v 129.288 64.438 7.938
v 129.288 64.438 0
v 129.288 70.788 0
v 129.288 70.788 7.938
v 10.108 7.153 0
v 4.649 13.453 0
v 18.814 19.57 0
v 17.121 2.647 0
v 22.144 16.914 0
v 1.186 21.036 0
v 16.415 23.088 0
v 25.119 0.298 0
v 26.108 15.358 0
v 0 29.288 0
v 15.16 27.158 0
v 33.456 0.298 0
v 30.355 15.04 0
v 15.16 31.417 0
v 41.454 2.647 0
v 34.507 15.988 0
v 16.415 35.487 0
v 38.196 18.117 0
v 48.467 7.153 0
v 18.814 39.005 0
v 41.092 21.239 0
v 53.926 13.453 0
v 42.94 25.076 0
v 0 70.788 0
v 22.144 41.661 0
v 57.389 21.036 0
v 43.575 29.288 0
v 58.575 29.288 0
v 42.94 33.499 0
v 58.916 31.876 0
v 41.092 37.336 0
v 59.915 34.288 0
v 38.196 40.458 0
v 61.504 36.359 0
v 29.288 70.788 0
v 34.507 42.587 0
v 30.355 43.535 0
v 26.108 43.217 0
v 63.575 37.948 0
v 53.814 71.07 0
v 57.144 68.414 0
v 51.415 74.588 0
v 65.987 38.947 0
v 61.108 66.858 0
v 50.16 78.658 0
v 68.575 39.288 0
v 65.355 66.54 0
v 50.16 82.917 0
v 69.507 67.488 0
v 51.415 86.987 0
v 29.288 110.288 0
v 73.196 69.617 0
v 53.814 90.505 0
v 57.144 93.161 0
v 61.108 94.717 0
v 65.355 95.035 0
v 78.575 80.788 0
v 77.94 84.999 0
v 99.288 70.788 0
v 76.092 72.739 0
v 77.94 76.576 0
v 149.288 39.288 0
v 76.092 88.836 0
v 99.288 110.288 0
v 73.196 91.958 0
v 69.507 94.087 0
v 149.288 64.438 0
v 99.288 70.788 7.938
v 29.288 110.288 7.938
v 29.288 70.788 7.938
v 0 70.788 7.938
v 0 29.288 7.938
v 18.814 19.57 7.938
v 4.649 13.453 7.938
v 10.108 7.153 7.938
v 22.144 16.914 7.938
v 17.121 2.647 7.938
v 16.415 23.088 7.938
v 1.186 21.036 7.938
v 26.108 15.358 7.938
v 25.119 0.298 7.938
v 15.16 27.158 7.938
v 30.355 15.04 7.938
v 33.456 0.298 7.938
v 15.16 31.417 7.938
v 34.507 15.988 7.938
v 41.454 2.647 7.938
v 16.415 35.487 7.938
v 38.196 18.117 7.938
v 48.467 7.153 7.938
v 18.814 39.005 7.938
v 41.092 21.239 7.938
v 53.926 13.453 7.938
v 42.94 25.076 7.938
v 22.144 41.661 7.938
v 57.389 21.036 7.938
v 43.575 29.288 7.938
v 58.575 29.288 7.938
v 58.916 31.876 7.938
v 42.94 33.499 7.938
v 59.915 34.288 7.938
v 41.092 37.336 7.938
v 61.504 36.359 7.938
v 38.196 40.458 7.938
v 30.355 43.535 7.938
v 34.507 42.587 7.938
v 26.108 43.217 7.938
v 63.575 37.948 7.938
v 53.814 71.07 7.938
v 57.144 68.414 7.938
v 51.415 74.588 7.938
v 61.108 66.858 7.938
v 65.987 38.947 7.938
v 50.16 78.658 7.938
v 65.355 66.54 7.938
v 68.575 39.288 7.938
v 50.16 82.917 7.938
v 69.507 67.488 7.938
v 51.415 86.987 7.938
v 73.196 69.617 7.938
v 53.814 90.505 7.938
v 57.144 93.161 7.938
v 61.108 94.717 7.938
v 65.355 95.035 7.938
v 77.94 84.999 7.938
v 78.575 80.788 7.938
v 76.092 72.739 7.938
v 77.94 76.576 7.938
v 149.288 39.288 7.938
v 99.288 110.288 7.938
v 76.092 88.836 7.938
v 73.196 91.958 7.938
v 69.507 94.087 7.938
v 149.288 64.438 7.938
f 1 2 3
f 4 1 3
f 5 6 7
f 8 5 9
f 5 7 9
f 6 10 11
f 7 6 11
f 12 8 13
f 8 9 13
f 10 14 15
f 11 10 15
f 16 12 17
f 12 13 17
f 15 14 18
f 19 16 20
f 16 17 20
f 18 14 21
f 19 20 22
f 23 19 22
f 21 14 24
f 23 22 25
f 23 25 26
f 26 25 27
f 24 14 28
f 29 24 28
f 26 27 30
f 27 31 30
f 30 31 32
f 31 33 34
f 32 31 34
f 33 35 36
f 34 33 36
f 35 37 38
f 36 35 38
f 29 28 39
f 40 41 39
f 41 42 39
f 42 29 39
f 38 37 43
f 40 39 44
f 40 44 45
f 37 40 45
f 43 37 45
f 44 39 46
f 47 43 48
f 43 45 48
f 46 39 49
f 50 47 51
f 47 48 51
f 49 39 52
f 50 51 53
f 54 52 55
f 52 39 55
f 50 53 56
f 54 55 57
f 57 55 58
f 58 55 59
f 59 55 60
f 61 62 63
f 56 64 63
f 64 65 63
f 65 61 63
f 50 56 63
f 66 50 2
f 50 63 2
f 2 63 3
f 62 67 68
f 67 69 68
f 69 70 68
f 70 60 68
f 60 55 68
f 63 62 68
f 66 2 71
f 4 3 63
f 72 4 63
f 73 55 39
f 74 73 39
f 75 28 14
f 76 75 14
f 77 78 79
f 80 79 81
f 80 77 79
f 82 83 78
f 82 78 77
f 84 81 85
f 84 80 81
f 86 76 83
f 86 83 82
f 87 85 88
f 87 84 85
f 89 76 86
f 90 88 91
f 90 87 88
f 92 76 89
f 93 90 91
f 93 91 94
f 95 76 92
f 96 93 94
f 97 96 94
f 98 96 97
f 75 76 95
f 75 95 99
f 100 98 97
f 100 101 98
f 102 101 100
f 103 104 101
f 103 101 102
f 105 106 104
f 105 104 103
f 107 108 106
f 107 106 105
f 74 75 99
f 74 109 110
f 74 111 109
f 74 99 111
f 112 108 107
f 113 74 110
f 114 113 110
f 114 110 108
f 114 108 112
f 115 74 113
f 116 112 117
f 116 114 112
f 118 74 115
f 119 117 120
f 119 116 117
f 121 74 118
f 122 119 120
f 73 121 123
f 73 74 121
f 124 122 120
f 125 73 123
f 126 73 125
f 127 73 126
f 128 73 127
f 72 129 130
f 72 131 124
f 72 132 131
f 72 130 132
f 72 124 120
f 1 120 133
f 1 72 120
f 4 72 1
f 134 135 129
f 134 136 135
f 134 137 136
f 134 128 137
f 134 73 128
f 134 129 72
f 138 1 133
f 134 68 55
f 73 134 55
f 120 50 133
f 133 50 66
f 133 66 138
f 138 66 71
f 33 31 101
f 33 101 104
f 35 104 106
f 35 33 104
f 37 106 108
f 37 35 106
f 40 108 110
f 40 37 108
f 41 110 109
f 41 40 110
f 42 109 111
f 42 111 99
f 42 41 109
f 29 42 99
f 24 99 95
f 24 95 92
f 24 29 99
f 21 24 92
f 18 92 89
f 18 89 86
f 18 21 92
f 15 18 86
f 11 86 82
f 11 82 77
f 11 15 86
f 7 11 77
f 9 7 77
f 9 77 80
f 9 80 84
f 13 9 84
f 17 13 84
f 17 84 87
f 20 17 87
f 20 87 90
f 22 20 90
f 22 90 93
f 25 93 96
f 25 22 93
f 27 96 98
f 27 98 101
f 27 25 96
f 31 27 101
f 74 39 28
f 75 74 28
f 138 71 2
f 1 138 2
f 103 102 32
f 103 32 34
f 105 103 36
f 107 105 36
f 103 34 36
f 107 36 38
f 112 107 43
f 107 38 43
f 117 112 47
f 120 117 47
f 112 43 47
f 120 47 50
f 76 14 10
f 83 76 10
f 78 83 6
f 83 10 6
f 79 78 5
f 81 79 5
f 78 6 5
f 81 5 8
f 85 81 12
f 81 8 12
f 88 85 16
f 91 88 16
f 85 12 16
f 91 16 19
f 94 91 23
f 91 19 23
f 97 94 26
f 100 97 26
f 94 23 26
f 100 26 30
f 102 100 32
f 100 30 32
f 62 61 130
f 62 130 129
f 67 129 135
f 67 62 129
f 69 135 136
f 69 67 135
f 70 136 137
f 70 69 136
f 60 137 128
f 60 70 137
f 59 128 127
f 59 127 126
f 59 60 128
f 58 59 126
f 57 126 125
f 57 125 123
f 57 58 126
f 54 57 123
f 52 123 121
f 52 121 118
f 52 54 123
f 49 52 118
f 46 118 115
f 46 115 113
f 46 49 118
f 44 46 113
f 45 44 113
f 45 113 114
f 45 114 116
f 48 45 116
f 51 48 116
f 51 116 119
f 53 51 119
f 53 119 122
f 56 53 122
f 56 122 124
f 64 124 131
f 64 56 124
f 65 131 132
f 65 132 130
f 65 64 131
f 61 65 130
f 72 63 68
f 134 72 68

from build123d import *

# Parameters (mm, degrees)
SKETCH1_R           = 14.2875
BOSS_EXTRUDE1_DEPTH = 7.9375


with BuildPart() as part:
    # Sketch1 → Boss-Extrude1 (new body)
    with BuildSketch(Plane.XY):
        with BuildLine():
            Line((149.2875, 39.2875), (149.2875, 64.4375))
            Line((149.2875, 64.4375), (129.2875, 64.4375))
            Line((129.2875, 64.4375), (129.2875, 70.7875))
            Line((129.2875, 70.7875), (99.2875, 70.7875))
            Line((99.2875, 70.7875), (99.2875, 110.2875))
            Line((99.2875, 110.2875), (29.2875, 110.2875))
            Line((29.2875, 110.2875), (29.2875, 70.7875))
            Line((29.2875, 70.7875), (0, 70.7875))
            Line((0, 70.7875), (0, 29.2875))
            ThreePointArc((0, 29.2875), (29.2875, 0), (58.575, 29.2875))
            ThreePointArc((58.575, 29.2875), (61.503932188, 36.358567812), (68.575, 39.2875))
            Line((68.575, 39.2875), (149.2875, 39.2875))
        make_face()
        with Locations((64.2875, 80.7875)):
            Circle(SKETCH1_R, mode=Mode.SUBTRACT)
        with Locations((29.2875, 29.2875)):
            Circle(SKETCH1_R, mode=Mode.SUBTRACT)
    extrude(amount=BOSS_EXTRUDE1_DEPTH)


solid = part.part
